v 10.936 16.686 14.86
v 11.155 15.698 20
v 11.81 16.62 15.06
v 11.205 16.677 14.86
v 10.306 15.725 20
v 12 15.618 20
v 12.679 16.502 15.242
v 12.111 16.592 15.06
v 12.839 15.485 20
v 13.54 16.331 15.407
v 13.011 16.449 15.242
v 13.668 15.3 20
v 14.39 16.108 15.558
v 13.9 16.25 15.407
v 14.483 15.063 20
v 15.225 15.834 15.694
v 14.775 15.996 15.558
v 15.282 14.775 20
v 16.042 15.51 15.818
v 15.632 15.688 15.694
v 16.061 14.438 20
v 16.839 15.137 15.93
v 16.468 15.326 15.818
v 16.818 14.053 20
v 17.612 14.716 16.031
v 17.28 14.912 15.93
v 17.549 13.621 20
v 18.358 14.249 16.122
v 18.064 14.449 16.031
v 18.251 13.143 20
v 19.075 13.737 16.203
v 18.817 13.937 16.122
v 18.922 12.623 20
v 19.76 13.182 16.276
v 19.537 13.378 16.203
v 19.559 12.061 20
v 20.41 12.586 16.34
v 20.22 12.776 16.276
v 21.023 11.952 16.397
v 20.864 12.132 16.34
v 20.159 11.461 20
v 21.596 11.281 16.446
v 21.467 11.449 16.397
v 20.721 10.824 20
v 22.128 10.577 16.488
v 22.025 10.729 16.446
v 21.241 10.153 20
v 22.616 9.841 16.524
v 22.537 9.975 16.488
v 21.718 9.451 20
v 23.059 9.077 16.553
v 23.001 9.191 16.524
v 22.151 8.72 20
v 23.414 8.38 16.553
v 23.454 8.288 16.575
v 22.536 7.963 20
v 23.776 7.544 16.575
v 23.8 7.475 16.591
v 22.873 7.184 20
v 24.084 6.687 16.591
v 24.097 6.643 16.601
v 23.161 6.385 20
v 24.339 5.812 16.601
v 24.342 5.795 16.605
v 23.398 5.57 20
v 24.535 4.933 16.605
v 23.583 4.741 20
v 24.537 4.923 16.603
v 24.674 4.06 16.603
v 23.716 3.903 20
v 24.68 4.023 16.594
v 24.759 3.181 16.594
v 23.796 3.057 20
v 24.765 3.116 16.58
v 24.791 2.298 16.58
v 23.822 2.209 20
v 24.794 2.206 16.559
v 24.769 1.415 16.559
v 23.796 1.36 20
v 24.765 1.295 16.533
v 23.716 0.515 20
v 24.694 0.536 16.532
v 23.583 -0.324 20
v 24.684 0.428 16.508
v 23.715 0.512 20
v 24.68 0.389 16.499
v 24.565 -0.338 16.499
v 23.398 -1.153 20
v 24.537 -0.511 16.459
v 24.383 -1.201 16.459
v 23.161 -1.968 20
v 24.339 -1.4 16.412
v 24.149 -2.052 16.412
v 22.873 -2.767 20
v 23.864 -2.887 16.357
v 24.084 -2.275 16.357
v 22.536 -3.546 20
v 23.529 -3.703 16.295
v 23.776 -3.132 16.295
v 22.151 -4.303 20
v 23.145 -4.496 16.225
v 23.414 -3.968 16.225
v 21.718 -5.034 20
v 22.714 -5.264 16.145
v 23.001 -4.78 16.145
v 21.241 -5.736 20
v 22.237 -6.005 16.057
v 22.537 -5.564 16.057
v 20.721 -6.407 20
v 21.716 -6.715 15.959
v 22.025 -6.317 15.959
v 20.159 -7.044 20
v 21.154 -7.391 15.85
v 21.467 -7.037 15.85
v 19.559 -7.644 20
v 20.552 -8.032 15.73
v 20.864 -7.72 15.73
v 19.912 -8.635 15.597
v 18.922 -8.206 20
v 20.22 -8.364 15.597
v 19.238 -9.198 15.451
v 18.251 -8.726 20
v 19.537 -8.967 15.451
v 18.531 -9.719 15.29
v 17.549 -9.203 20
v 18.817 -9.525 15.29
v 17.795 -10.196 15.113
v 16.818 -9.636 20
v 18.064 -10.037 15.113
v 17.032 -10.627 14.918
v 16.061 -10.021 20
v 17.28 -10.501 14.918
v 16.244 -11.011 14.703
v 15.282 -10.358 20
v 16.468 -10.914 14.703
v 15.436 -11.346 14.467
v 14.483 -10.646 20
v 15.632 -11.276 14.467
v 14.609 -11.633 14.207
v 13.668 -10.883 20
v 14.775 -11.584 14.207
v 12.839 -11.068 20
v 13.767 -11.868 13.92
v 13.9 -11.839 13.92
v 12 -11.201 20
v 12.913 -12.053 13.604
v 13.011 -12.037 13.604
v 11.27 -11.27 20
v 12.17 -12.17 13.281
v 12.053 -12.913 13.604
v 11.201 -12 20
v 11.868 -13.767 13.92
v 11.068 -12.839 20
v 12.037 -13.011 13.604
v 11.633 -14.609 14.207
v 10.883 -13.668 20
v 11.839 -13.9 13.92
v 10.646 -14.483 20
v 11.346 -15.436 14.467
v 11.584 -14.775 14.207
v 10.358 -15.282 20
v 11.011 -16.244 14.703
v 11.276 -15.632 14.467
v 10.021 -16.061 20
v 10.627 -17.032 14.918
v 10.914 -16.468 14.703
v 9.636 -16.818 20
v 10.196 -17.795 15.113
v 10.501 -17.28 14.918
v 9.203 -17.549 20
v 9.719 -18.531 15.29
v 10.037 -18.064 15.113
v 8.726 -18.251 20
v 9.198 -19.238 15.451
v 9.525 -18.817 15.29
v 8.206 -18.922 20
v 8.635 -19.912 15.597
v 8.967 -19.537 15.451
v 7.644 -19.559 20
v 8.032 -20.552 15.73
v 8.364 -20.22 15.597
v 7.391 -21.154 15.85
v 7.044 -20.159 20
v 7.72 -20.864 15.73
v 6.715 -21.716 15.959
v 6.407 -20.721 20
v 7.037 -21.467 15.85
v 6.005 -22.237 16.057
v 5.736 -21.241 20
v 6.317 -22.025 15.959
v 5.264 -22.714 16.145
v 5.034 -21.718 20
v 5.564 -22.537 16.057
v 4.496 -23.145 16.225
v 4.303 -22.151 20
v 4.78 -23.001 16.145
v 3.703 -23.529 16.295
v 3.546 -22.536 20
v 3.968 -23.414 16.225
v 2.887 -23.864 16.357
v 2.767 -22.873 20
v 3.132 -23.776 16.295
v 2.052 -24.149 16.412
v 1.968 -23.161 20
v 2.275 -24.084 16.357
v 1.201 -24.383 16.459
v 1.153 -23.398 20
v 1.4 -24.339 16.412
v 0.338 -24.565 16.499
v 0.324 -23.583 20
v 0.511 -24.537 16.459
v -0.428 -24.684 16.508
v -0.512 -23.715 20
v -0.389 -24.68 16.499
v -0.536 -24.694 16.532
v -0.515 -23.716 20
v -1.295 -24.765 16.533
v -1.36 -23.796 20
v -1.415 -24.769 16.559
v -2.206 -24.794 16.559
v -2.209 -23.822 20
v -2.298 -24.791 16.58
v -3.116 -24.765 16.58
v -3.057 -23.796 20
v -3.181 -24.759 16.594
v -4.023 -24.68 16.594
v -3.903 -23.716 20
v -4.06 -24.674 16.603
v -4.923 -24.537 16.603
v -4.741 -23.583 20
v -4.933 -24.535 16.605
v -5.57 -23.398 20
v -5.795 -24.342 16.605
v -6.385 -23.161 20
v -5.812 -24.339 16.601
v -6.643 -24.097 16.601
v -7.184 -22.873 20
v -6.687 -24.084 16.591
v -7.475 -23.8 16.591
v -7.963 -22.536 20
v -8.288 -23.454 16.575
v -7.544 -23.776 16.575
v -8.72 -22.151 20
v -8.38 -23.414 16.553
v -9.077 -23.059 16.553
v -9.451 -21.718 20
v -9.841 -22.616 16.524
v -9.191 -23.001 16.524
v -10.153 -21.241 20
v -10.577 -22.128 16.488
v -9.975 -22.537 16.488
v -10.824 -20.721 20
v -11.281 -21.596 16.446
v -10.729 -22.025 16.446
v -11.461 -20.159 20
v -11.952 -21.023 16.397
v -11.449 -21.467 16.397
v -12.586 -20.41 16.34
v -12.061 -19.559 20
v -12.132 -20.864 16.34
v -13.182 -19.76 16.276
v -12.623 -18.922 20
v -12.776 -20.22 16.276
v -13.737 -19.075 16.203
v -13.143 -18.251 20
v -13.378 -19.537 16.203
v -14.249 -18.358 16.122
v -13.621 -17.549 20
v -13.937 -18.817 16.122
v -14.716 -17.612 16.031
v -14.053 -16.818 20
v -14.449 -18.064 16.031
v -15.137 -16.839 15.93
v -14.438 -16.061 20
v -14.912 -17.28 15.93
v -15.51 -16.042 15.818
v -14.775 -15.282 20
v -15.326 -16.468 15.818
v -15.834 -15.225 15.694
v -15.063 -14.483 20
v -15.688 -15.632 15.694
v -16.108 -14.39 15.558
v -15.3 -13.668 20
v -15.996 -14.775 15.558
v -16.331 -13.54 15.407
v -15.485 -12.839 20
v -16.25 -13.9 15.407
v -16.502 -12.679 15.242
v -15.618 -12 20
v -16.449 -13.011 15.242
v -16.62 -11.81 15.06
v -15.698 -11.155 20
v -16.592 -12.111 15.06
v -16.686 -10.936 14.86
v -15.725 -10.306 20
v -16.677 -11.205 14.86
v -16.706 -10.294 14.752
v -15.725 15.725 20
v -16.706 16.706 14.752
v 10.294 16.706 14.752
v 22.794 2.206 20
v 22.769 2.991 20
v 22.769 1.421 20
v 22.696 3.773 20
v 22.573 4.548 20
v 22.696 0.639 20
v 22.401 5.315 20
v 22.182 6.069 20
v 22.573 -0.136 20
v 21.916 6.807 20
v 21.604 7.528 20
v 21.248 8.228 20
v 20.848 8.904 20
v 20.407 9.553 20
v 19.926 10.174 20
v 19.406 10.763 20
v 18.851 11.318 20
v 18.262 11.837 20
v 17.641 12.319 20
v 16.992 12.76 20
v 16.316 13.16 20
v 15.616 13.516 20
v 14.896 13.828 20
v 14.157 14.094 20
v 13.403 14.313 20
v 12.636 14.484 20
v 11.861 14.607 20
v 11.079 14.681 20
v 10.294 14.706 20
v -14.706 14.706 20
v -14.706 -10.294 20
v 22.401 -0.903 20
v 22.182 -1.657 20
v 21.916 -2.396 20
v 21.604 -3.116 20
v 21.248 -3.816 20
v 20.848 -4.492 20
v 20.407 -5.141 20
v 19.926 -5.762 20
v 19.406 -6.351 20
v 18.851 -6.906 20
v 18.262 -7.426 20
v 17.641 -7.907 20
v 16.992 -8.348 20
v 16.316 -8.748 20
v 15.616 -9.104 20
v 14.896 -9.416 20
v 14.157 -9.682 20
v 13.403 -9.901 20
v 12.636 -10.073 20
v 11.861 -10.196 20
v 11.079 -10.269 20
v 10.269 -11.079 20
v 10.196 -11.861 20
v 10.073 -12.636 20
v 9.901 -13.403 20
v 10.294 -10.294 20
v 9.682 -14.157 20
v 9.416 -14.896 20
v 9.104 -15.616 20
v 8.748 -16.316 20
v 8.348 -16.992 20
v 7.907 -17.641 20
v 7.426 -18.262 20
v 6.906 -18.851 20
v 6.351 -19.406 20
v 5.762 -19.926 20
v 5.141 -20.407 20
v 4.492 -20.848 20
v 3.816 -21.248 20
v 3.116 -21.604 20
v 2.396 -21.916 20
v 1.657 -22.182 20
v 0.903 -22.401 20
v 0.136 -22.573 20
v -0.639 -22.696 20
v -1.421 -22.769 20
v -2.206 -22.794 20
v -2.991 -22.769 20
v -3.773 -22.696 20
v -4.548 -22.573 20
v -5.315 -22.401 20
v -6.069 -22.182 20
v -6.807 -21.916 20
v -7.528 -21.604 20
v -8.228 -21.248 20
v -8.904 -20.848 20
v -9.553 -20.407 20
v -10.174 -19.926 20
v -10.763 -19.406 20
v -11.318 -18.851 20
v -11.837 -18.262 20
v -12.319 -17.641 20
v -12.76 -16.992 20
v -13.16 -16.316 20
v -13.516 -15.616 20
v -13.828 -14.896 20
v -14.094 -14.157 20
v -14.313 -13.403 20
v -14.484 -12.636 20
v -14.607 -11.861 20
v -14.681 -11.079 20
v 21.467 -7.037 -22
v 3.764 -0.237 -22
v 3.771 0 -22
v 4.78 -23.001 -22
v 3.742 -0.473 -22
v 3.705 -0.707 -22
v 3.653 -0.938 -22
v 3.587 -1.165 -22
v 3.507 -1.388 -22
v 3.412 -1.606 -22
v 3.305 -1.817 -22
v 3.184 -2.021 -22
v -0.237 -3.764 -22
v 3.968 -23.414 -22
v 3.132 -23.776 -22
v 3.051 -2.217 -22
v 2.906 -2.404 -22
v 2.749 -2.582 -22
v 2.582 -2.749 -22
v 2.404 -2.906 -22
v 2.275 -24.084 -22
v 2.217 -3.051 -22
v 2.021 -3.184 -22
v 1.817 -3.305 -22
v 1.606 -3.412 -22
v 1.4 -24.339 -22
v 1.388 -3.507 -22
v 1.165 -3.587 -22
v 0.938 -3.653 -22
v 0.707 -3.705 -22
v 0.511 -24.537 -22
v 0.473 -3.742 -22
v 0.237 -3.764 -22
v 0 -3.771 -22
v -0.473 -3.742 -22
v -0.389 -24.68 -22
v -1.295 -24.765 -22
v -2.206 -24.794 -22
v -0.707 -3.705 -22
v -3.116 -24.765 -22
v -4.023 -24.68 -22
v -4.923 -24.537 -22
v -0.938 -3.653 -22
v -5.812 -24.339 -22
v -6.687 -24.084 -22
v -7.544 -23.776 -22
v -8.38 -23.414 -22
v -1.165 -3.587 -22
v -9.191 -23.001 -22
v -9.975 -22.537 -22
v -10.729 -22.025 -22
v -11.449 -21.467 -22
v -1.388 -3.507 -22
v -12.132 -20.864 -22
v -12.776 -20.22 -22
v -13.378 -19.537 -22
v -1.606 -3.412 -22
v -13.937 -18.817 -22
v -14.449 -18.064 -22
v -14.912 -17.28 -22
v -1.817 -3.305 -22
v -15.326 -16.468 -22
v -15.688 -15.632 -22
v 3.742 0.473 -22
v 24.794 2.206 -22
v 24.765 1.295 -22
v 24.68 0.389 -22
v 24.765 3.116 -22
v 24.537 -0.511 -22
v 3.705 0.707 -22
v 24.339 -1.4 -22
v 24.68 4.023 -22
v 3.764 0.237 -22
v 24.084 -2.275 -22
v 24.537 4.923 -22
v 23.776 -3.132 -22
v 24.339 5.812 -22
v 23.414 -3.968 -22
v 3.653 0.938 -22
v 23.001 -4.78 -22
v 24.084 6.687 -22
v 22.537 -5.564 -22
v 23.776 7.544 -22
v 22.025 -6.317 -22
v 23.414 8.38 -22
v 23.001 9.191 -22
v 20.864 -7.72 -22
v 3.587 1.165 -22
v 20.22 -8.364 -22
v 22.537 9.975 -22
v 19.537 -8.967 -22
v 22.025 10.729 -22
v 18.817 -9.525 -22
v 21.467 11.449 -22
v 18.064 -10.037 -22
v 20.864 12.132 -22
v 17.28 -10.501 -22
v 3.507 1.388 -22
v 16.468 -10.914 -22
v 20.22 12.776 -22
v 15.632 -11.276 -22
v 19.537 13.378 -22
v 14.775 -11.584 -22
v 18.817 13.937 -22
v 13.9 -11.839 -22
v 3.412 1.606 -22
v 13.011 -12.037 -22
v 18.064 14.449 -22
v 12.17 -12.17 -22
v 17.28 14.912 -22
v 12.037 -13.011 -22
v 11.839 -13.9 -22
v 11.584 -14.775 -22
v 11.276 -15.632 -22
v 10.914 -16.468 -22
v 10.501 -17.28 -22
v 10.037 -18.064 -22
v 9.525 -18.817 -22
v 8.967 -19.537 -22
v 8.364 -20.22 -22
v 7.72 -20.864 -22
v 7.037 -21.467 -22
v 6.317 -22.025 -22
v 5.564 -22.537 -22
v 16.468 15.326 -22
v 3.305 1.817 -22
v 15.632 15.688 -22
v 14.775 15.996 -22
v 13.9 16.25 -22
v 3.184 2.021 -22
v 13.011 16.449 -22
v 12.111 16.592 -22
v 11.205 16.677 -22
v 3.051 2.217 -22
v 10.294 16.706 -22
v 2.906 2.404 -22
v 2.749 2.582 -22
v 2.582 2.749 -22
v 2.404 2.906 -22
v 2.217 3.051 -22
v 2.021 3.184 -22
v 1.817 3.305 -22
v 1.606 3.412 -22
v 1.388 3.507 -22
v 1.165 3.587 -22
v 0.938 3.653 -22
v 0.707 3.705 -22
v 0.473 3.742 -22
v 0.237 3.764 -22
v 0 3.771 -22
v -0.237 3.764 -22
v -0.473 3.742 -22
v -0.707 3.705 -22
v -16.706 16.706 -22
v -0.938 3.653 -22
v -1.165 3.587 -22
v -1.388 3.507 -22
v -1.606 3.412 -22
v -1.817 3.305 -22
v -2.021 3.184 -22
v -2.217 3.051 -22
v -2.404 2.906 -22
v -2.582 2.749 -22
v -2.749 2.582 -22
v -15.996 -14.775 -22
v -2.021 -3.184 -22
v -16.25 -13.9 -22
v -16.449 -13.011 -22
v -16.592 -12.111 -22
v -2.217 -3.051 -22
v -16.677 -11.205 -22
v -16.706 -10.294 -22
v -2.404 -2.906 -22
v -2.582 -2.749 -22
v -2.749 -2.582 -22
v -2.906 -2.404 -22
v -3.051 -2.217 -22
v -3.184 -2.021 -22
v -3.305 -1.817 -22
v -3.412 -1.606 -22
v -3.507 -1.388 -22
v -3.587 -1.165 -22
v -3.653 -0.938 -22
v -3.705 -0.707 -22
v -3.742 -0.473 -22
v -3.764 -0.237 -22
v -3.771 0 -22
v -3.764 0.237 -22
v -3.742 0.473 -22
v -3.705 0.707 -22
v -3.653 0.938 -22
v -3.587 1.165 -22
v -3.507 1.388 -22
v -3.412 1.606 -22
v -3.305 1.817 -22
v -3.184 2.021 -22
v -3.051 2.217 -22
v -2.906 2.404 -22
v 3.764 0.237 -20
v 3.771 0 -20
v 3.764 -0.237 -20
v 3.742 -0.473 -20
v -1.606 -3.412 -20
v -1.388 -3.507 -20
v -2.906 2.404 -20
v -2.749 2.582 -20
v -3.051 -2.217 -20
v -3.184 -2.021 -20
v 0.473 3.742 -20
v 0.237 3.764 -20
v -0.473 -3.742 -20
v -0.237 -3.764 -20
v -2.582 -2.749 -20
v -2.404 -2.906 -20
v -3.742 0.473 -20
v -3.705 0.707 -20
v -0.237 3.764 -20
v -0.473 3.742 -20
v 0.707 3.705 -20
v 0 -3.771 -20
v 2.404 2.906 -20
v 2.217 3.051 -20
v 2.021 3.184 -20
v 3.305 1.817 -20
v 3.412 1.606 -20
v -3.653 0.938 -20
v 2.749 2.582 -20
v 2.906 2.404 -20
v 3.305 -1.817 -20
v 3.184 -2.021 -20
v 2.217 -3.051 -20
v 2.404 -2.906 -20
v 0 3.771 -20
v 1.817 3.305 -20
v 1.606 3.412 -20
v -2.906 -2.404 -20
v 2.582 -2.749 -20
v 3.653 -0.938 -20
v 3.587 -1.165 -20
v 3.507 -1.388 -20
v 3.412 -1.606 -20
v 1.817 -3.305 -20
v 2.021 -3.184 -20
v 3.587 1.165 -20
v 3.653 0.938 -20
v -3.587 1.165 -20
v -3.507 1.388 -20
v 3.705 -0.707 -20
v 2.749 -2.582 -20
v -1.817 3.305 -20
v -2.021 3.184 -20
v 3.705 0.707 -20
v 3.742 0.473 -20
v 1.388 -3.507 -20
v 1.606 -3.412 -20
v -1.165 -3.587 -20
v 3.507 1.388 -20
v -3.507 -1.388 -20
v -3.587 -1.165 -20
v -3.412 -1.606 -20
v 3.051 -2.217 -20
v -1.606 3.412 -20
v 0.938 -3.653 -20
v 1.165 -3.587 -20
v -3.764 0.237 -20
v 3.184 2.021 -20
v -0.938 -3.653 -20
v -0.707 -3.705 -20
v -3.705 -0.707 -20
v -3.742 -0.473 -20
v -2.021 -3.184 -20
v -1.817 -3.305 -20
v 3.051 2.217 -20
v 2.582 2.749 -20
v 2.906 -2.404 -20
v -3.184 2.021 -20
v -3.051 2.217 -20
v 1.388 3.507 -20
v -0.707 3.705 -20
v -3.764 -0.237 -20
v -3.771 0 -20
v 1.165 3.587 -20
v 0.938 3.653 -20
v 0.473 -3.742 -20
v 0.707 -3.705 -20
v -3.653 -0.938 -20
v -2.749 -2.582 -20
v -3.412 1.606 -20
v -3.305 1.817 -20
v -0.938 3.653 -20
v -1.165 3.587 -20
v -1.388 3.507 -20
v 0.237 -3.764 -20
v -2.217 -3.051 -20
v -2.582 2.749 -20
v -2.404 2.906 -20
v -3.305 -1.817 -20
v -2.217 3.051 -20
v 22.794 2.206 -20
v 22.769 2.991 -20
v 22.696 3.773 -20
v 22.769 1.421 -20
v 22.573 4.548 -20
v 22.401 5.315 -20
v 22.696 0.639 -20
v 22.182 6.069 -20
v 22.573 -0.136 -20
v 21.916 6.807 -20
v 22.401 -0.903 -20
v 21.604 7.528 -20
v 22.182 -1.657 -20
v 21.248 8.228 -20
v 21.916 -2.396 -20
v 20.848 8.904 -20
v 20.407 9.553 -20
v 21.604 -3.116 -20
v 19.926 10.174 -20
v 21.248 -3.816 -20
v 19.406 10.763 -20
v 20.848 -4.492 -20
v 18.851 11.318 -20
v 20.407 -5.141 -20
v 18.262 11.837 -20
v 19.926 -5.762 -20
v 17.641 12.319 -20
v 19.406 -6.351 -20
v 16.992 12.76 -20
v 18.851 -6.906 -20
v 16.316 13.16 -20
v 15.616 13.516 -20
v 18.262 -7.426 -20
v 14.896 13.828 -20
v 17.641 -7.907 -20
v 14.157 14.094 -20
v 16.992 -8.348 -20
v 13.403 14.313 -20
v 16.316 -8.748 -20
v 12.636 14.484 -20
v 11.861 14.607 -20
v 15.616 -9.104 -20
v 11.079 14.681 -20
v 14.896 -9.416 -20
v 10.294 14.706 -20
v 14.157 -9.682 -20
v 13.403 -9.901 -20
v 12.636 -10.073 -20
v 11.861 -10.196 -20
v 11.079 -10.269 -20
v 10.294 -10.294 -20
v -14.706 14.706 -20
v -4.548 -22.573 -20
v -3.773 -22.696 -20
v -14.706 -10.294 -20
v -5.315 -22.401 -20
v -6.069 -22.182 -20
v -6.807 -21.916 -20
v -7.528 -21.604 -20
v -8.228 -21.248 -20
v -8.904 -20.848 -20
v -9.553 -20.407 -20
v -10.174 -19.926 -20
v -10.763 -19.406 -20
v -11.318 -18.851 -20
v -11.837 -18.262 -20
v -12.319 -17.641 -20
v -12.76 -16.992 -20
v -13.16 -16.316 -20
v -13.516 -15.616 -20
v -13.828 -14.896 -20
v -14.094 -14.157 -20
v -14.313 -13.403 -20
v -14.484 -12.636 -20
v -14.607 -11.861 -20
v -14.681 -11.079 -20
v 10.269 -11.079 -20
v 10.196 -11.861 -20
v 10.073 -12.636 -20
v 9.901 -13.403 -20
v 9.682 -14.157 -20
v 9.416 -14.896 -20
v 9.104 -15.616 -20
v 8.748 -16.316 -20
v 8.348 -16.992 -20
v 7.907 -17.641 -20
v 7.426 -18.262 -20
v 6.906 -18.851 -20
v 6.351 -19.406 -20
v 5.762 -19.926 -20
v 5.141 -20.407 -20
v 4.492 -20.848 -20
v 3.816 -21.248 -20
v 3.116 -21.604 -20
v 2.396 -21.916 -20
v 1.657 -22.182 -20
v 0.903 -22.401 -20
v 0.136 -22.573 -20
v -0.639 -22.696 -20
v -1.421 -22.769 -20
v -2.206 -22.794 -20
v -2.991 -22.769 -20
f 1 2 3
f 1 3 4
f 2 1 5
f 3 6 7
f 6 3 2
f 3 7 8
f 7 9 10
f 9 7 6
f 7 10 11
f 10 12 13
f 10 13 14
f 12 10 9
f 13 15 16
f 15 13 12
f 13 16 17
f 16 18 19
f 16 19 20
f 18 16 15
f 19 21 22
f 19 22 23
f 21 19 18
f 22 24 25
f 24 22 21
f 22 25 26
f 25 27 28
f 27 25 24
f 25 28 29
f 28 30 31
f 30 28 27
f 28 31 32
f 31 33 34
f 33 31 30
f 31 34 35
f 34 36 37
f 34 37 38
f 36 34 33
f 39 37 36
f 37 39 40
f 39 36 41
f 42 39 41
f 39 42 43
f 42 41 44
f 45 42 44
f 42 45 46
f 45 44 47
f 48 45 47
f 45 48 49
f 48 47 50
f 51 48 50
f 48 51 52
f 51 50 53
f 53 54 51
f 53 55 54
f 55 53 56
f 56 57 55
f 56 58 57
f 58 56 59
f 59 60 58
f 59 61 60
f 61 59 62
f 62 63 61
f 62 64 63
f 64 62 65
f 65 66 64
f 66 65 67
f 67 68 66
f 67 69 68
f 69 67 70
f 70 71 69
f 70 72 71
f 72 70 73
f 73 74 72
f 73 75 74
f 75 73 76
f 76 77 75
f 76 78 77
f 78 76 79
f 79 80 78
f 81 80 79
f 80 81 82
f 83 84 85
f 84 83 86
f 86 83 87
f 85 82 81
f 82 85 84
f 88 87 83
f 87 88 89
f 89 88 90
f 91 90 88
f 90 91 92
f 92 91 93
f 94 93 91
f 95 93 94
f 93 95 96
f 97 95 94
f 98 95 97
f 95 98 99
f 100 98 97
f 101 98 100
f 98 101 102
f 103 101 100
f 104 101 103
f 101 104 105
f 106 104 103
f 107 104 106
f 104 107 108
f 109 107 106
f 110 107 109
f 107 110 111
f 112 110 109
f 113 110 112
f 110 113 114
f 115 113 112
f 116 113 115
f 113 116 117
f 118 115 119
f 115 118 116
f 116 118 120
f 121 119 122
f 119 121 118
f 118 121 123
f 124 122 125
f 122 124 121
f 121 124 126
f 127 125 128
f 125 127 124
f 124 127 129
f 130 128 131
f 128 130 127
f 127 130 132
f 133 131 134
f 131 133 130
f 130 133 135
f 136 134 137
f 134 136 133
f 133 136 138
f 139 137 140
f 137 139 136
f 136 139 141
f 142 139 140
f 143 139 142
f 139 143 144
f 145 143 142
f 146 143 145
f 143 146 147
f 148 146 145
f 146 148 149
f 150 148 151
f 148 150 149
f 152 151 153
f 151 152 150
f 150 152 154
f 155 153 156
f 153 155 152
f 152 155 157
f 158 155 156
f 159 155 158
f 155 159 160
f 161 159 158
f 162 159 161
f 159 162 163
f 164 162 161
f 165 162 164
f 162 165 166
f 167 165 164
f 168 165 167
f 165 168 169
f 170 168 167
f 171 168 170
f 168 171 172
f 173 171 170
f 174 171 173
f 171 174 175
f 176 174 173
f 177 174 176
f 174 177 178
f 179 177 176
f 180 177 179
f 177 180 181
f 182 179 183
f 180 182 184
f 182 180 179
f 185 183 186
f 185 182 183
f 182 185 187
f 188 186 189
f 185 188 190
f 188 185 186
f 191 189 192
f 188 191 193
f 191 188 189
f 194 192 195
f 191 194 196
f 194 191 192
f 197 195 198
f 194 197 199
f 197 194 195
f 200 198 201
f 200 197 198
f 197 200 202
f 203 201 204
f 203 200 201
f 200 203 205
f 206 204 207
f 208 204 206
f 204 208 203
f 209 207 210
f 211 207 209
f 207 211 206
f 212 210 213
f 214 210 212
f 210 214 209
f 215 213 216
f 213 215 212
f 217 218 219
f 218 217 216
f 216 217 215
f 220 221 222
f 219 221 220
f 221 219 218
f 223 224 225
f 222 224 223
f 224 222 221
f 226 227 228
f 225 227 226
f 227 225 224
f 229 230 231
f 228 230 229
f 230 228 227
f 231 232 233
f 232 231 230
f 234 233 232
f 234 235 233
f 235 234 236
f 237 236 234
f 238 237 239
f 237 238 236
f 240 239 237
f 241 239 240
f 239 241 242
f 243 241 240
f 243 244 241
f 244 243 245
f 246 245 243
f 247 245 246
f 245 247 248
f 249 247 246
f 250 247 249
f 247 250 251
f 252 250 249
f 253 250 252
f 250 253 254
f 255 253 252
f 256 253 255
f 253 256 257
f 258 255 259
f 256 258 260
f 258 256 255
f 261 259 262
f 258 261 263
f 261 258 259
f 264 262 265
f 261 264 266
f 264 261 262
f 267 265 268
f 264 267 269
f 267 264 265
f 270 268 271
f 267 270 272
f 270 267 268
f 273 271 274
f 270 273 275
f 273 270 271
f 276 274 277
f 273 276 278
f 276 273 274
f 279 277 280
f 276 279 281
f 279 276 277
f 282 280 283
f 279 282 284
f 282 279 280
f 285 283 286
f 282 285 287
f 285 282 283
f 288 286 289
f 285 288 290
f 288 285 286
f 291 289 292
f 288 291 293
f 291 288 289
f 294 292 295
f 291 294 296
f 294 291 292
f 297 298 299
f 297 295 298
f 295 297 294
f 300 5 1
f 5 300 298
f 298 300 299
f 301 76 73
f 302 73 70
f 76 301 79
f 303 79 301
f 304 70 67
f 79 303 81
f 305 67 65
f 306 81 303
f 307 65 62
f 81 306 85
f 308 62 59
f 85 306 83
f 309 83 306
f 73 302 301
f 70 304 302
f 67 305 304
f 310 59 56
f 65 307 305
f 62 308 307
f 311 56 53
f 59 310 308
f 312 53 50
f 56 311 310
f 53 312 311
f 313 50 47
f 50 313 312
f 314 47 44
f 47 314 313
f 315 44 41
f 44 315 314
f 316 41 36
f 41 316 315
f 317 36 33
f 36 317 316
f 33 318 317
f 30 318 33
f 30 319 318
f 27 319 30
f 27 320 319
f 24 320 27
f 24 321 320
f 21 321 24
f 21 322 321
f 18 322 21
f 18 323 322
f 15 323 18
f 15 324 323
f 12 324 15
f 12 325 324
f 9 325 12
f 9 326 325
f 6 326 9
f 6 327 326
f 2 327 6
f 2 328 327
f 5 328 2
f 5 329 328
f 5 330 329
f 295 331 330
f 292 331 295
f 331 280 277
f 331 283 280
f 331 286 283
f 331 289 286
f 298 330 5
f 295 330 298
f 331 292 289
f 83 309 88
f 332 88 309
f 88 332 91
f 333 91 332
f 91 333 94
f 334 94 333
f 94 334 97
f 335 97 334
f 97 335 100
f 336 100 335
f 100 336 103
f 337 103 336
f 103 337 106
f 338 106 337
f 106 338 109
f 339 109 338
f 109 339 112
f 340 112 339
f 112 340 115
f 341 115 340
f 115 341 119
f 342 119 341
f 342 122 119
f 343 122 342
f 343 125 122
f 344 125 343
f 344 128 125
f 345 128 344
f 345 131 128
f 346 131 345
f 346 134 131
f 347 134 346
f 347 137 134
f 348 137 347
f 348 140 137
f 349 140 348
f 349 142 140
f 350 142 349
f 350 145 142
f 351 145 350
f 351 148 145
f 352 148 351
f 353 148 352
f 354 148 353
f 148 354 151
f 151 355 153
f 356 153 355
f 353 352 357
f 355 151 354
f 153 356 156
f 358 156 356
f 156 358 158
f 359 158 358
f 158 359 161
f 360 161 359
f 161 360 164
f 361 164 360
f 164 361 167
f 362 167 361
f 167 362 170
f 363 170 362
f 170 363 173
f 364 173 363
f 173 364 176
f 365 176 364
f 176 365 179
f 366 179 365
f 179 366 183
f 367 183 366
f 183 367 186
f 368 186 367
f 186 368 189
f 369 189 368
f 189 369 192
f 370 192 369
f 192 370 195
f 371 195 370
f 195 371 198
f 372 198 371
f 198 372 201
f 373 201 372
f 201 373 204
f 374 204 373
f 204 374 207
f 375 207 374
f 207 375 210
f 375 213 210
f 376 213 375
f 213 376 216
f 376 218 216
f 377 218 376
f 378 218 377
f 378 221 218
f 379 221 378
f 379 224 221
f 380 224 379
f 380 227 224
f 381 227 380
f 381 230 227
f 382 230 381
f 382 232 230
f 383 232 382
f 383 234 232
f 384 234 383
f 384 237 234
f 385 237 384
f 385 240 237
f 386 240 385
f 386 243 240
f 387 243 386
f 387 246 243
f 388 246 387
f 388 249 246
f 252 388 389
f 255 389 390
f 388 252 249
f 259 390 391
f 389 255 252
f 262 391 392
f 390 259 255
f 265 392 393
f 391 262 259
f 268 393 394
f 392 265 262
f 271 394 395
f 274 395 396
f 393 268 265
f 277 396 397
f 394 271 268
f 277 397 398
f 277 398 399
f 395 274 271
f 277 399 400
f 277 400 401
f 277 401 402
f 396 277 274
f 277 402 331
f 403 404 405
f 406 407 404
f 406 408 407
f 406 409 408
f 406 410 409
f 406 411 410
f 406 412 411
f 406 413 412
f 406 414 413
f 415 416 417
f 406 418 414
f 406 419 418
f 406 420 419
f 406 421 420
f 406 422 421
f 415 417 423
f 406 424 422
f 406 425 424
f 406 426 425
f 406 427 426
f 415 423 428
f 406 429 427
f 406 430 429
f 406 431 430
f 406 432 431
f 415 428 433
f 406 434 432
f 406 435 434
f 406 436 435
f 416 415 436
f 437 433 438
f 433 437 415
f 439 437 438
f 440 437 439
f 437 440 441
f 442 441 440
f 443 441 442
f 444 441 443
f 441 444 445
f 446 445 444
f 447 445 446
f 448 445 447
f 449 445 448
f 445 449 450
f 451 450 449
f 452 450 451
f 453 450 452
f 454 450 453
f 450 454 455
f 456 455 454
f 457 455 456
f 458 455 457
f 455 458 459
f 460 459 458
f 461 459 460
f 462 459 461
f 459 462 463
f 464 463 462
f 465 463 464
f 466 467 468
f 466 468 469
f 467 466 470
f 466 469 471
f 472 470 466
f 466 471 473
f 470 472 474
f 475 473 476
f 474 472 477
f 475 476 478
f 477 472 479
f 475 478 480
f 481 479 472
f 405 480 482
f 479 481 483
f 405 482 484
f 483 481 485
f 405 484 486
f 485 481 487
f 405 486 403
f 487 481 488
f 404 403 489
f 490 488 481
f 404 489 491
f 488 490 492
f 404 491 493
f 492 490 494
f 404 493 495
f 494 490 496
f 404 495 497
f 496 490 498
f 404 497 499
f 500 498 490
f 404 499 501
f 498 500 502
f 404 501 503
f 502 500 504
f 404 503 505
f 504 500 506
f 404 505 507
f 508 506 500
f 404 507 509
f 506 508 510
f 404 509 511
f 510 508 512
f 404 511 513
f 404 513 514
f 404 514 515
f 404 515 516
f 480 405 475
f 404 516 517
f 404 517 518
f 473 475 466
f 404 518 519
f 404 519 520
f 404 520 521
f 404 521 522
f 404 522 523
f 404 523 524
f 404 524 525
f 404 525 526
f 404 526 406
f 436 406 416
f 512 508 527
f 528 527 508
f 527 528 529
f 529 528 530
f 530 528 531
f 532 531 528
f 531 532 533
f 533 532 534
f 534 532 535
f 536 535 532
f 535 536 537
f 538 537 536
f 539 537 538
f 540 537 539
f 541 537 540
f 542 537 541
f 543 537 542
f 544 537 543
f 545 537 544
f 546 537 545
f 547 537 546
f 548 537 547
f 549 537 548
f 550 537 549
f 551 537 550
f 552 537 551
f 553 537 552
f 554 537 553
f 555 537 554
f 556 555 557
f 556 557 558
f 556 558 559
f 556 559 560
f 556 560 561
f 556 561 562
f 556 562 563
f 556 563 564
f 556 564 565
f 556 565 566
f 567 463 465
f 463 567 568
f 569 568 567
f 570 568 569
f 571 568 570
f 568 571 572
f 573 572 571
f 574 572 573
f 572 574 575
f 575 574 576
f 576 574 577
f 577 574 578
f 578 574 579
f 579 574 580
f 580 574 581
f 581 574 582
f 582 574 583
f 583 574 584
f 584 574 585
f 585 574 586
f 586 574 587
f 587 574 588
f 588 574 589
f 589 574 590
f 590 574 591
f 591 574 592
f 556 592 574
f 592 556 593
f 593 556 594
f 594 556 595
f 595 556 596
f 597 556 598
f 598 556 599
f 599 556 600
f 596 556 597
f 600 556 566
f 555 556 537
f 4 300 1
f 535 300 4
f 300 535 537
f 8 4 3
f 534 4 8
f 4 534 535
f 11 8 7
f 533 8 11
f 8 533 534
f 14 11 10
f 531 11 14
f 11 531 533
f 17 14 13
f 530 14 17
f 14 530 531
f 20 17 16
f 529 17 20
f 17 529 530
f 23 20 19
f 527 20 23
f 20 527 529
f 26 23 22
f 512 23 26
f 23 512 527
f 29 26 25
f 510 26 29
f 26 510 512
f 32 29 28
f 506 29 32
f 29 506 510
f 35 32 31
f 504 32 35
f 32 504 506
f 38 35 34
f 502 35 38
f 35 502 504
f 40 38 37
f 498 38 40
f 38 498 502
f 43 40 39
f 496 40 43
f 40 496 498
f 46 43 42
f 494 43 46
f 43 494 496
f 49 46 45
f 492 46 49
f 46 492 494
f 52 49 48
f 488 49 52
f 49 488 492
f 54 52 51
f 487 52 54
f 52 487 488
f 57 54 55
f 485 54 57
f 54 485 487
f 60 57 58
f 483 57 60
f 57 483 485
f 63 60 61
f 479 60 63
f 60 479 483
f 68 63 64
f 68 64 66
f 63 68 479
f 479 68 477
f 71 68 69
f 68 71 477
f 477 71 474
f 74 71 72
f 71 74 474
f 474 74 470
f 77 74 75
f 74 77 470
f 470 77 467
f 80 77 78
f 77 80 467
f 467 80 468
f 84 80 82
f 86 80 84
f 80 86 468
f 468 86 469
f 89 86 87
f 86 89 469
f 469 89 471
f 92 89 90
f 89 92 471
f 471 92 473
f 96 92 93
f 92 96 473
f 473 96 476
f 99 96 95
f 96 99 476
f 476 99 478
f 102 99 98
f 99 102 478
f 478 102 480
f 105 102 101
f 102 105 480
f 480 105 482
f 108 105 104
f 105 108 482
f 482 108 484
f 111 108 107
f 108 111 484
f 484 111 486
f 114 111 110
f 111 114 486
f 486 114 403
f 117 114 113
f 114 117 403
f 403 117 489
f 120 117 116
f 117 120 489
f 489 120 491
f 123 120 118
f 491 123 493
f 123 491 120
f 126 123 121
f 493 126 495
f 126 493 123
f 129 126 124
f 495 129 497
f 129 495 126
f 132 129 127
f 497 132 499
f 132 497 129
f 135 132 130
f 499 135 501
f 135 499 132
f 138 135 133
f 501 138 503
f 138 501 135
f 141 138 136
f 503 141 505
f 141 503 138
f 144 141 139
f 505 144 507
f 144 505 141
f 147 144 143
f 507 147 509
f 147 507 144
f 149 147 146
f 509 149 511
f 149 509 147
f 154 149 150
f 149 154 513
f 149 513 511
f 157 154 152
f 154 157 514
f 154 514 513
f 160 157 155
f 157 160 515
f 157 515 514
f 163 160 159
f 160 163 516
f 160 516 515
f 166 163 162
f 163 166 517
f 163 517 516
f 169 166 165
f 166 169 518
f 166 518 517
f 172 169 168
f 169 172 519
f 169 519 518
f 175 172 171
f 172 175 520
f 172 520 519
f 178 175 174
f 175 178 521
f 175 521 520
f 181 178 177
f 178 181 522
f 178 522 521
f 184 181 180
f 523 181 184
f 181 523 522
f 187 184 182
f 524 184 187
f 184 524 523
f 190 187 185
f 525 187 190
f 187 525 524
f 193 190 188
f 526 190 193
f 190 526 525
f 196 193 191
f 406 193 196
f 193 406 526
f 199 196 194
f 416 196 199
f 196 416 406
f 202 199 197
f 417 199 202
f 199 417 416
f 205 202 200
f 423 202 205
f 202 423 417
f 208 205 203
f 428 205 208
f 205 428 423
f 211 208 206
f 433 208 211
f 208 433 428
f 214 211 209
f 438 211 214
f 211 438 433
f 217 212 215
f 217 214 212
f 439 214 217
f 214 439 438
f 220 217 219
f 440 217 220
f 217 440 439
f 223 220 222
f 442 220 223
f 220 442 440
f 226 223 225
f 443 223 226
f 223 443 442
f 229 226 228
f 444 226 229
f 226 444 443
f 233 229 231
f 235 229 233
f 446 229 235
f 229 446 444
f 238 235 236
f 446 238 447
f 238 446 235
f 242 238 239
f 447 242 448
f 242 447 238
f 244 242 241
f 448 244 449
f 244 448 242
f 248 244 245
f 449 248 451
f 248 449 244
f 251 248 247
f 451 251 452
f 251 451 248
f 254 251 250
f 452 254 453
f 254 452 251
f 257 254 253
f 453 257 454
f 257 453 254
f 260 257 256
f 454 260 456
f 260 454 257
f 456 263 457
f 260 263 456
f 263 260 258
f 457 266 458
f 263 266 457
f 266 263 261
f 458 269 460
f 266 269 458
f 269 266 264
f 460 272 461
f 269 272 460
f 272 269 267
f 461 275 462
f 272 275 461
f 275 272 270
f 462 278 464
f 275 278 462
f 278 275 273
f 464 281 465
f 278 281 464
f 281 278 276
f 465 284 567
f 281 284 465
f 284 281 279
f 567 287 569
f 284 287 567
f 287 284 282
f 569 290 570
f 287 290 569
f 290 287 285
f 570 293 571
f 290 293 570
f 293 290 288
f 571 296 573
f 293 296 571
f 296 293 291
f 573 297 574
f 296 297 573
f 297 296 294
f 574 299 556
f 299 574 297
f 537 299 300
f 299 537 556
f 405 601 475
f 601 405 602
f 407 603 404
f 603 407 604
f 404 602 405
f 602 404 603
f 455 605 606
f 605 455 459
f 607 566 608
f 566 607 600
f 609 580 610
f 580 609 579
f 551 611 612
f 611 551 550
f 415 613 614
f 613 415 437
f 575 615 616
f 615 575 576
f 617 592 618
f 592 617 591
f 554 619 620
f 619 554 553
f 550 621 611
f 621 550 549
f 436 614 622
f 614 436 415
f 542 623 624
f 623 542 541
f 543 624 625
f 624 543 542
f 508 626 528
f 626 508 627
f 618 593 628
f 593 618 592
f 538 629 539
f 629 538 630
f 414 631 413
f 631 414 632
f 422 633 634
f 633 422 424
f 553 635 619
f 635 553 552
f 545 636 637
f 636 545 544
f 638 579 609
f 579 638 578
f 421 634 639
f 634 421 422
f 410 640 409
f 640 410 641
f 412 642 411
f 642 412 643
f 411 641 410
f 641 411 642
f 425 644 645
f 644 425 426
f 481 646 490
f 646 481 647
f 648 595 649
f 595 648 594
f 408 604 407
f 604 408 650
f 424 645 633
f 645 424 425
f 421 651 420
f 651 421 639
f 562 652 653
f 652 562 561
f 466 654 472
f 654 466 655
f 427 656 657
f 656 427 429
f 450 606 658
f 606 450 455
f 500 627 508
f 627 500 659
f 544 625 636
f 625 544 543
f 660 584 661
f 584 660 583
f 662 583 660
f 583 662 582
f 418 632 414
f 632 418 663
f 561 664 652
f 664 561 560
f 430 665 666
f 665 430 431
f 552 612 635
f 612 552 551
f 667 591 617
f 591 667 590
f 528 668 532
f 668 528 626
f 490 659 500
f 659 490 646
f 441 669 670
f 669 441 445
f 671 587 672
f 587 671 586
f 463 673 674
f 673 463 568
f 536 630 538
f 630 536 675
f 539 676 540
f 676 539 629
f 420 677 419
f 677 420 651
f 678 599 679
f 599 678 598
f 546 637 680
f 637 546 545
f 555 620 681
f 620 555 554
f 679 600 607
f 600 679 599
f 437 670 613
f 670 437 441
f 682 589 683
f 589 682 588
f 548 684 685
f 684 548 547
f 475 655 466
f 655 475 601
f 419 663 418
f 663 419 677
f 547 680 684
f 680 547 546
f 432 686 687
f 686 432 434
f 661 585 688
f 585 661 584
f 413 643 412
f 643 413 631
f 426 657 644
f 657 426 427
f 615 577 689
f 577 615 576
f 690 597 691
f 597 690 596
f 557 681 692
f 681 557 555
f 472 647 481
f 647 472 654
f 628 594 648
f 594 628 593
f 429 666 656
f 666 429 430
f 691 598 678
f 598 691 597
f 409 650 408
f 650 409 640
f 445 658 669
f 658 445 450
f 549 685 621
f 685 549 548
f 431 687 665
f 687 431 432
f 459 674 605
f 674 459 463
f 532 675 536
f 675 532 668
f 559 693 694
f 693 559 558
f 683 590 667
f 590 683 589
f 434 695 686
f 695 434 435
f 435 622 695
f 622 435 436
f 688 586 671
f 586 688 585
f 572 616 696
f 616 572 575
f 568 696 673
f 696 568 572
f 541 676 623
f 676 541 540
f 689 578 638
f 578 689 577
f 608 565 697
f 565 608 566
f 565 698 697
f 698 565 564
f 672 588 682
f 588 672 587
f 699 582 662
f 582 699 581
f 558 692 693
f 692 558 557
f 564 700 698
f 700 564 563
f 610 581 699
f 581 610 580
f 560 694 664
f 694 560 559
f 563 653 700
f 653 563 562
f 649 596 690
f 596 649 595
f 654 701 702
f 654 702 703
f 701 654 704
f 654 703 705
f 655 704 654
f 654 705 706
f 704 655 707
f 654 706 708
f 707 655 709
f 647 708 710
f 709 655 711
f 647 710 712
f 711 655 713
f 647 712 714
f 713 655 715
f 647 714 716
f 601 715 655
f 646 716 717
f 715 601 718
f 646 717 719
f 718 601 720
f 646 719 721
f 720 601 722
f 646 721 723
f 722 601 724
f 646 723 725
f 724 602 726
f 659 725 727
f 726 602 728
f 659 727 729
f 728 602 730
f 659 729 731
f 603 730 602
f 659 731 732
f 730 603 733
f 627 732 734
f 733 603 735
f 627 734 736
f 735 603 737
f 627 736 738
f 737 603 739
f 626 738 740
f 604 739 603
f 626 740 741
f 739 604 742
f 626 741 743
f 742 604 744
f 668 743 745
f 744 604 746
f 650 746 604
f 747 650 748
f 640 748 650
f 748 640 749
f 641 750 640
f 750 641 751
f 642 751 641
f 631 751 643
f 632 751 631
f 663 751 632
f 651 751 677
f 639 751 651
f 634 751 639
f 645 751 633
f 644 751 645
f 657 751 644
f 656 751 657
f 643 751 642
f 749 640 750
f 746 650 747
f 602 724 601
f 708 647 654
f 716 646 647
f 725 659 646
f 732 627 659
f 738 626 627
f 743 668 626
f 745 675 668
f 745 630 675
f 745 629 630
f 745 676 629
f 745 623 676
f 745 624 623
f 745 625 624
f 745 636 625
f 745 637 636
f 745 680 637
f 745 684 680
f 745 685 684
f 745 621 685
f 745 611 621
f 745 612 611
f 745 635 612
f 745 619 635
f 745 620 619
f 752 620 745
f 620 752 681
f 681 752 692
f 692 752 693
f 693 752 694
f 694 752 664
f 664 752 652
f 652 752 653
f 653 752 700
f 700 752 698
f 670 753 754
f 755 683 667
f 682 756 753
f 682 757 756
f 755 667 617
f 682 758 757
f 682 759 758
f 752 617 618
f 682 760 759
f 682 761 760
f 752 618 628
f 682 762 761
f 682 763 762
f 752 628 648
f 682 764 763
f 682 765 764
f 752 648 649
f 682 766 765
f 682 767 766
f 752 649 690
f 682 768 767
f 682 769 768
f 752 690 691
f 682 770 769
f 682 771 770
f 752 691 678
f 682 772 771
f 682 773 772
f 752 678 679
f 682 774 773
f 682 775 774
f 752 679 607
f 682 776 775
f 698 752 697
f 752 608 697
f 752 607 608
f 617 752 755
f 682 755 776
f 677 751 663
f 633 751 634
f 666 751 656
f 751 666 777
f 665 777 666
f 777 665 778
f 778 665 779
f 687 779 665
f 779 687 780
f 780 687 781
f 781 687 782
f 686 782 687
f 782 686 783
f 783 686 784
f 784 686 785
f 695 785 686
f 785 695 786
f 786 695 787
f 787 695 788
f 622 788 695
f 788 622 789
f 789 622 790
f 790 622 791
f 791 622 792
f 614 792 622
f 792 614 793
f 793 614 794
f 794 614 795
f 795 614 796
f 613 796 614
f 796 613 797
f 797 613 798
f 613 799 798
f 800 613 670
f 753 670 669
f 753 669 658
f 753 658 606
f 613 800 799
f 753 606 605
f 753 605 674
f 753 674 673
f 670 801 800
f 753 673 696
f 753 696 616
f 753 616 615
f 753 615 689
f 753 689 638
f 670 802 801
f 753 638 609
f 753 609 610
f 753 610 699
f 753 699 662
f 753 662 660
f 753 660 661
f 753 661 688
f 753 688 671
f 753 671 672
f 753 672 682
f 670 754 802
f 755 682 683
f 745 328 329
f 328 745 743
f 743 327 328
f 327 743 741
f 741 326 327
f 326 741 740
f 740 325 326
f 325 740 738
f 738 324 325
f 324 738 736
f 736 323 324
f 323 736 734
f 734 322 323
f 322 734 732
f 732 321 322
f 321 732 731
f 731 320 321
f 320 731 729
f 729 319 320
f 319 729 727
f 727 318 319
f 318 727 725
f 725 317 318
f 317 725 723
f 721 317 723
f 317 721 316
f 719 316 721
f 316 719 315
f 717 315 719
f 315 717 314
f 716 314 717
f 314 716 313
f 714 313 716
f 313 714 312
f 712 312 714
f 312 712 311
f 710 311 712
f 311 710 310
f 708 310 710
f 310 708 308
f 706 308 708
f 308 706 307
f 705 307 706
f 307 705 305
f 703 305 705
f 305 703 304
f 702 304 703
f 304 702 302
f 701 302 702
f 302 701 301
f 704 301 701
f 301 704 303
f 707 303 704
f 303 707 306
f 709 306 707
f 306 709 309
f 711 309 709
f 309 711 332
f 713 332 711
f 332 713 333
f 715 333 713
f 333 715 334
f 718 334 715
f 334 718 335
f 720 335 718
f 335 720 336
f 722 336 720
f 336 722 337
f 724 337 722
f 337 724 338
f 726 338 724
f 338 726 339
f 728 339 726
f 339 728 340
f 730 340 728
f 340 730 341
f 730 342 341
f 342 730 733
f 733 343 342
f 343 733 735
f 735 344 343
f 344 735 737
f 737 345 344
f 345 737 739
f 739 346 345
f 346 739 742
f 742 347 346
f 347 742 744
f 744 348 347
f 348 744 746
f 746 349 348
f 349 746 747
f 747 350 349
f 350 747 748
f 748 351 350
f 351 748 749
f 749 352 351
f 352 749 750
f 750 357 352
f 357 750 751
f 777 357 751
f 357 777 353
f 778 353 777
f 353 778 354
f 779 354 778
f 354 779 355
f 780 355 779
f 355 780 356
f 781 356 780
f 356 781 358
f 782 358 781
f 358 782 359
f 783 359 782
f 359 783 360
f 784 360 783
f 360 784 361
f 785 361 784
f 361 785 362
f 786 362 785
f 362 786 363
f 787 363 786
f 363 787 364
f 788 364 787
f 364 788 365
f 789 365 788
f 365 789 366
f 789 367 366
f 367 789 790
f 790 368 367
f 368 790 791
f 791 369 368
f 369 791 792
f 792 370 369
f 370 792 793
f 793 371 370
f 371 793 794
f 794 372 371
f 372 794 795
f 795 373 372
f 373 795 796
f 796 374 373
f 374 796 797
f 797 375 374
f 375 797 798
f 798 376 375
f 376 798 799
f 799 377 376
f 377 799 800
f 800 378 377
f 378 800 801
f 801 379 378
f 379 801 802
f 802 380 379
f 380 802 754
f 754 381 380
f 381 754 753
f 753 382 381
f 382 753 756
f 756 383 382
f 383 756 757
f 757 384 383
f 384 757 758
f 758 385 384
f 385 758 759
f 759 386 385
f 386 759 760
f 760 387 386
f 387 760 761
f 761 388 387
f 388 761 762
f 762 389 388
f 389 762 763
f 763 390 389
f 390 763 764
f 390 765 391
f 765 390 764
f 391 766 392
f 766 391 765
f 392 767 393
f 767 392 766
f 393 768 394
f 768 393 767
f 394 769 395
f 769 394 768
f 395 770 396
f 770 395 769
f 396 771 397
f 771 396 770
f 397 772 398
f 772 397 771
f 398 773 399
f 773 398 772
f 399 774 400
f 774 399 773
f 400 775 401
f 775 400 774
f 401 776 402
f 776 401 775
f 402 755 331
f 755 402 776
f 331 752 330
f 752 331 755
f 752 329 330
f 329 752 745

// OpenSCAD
// ************* Credits part *************
//            "Mini-sandwich Maker" 
// Programmed by Rudy RUFFEL - Decembre 2014
// Optimized for Customizer makerbot
//
//
//********************** License ******************
//**        "Mini-sandwich_Maker" by rr2s        **
//**  is licensed under the Creative Commons     **
//** - Attribution - Non-Commercial license.     **
//*************************************************
//
//
// ************* Declaration part *************
/* [Global] */

/* [Part] */
// Select the part you want to see. If you change the settings select all the parts with the same setting.
PartOfObject = "Base";// [Base:Base,Pusher:Pusher,Axispusher:Axis pusher,Cap:Cap]


/* [Type] */
// What type of Mini-sandwich you want.
Type = "Heart"; // [Cylinder:Cylinder,Square:Square,Hex:Hex,Octagonal:Octagonal,Rectangle:Rectangle,RectangleBevel:Rectangle/Square Bevel,Oval:Oval,Heart:Heart]
// What type cap of Mini-sandwich you want.
TypeCap = "Sphere";// [Cube:Cube,Sphere:Sphere]
// What type Axis Pusher of Mini-sandwich you want.
TypeAxis = "Cylinder";// [Square:Square,Cylinder:Cylinder,Hex:Hex]
// Resolution Bevel if you have choose Rectangle/Square Bevel
RectangleBevelResoltuion = 50;



/* [Settings] */
// (Height of your Mini-sandwich in mm)
Height = 35;
// (The width of your Mini-sandwich in mm. if it's a circle or oval this is the diameter.if it's Heart this is a size)
Width = 25; 
// (The length of your Mini-sandwich in mm. If it's Oval Length)
Length = 25;


/* [Hidden] */

	// ************* private variable *************
   // No change this variable. The code needs to be improved to use these variable.
	TP  = 5;//ThicknessPusher
	H   = Height+TP;
	W   = Width;
	L   = Length;
	TH  = 2 ; //ThicknessWall 
	// other
	HAP = H+10;  //Height Axis Of Piston
	WAP = W/3.5; //Width Axis Of Piston or diametre if cinylinder or oval
	LAP = L/3.5; //Length Axis Of Piston
	RSB = RectangleBevelResoltuion;


// ************* Executable part *************

Type_Part();

// ************* Module part Piston *************



// Axis Piston Print
module AxisOfPistonCylinder(){
		if (TypeAxis == "Cylinder"){
			translate([0,0,-HAP/2+H-TH]) cylinder(HAP+TH, WAP/2, WAP/2,$fn=100);
		}if (TypeAxis == "Square"){
			translate([0,0,-HAP/2+H-TH]) cylinder(HAP+TH, WAP/2, WAP/2,$fn=4);
		}else if (TypeAxis == "Hex"){
			translate([0,0,-HAP/2+H-TH]) cylinder(HAP+TH, WAP/2, WAP/2,$fn=6);
		}
	}



// Cap of the piston Sphere
module CapPistionSphere(){
		translate([0,0,HAP+H/2+-WAP*1.5]) difference(){
		sphere(W/2,$fn=150);
		translate([0,0,-W/2]) cube(W,center=true);
		}
}

// cap of the piston Cube
module CapPistionCube(){
	translate([0,0,HAP+H/2+WAP+-W/2]) cube ([W/1.5,L/1.5,W/2],center=true);
	}


// Axis Piston Cut
module AxisOfPistonCylinderCutBase(){
		if (TypeAxis == "Cylinder"){
			translate([0,0,-HAP/2+H-TH]) cylinder(HAP+TH, WAP/2+0.2, WAP/2+0.2,$fn=100);
		}if (TypeAxis == "Square"){
			translate([0,0,-HAP/2+H-TH]) cylinder(HAP+TH, WAP/2+0.2, WAP/2+0.2,$fn=4);
		}else if (TypeAxis == "Hex"){
			translate([0,0,-HAP/2+H-TH]) cylinder(HAP+TH, WAP/2+0.2, WAP/2+0.2,$fn=6);
		}
	}



// ************* Module part For Cylinder *************
module BaseCylinder(){
	translate([0,0,-H/2]) cylinder(H+TH, W/2+TH, W/2+TH,$fn=100);
}

module PusherCylinder(){
	translate([0,0,H/2-TP-TP/2]) cylinder(TP, W/2-0.5, W/2-0.5,$fn=100);
} 

module CutCylinder(){
	translate([0,0,-H/2-1]) cylinder(H+1, W/2, W/2,$fn=100);
}

module CutCylinderAngle(){
	difference(){
	translate([0,0,-H/2-1]) cylinder(H+TH, W/2+TH, W/2+TH+H/3,$fn=100);
	translate([0,0,-H/2-1]) cylinder(H+TH, W/2+TH-(TH/1.1), W/2+TH+H/3,$fn=100);
	}
}


// ************* Module part For Square *************	

module BaseSquare(){
	translate([0,0,-H/2]) cylinder(H+TH, W/2+TH*2, W/2+TH*2,$fn=4);
}

module PusherSquare(){
	translate([0,0,H/2-TP-TP/2]) cylinder(TP, W/2-0.5, W/2-0.5,$fn=4);
} 

module CutSquare(){
	translate([0,0,-H/2-1]) cylinder(H+1, W/2, W/2,$fn=4);
}

module CutSquareAngle(){
	difference(){
	translate([0,0,-H/2-1]) cylinder(H+TH, W/2+TH*2, W/2+TH+H/3,$fn=4);
	translate([0,0,-H/2-1]) cylinder(H+TH, W/2+TH*1.5-(TH/1.1), W/2+TH*4+H/3,$fn=4);
	}
}





// ************* Module part For Hex *************	
module BaseHex(){
	translate([0,0,-H/2]) cylinder(H+TH, W/2+TH, W/2+TH,$fn=6);
}

module PusherHex(){
	translate([0,0,H/2-TP-TP/2]) cylinder(TP, W/2-0.5, W/2-0.5,$fn=6);
} 

module CutHex(){
	translate([0,0,-H/2-1]) cylinder(H+1, W/2, W/2,$fn=6);
}

module CutHexAngle(){
	difference(){
	translate([0,0,-H/2-1]) cylinder(H+TH, W/2+TH, W/2+TH+H/3,$fn=6);
	translate([0,0,-H/2-1]) cylinder(H+TH, W/2+TH-(TH/1.1), W/2+TH+H/3,$fn=6);
	}
}



// ************* Module part For Octagonal *************	

module BaseOctagonal(){
	translate([0,0,-H/2]) cylinder(H+TH, W/2+TH, W/2+TH,$fn=8);
}

module PusherOctagonal(){
	translate([0,0,H/2-TP-TP/2]) cylinder(TP, W/2-0.5, W/2-0.5,$fn=8);
} 

module CutOctagonal(){
	translate([0,0,-H/2-1]) cylinder(H+1, W/2, W/2,$fn=8);
}

module CutOctagonalAngle(){
	difference(){
	translate([0,0,-H/2-1]) cylinder(H+TH, W/2+TH, W/2+TH+H/3,$fn=8);
	translate([0,0,-H/2-1]) cylinder(H+TH, W/2+TH-(TH/1.1), W/2+TH+H/3,$fn=8);
	}
}


// ************* Module part For Rectangle *************

module BaseRectangle(){
	translate([0,0,TH/2]) cube ([W+TH*2,L+TH*2,H+TH],center=true);
}

module PusherRectangle(){
	translate([0,0,H/2-TP]) cube ([W-0.5,L-0.5,TP],center=true);
} 

module CutRectangle(){
	translate([0,0,TH/2-1]) cube ([W,L,H+1],center=true);
}

module CutRectangleAngle(){
	difference(){
	translate([0,0,-H/2+-0.5])  linear_extrude(H+TH,scale=2)  square([W+TH*2,L+TH*2],center=true);
	translate([0,0,-H/2+-0.5])  linear_extrude(H+TH,scale=1.5)  square([W+TH,L+TH],center=true);
	}
}



// ************* Module part For RectangleBevel*************	

module BaseRectangleBevel(){
	minkowski(){
		translate([0,0,TH/2-1]) cube ([W+TH*2-20,L+TH*2-20,H+TH-2],center=true);
		cylinder(r=10,2,$fn = RSB);
	}
}

module PusherRectangleBevel(){
	minkowski(){
		translate([0,0,H/2-TP-TP/2+1.5])cube ([W-0.5-20,L-0.5-20,TP-2],center=true);
		cylinder(r=10,2,$fn = RSB);
	}
} 

module CutRectangleBevel(){
	minkowski(){
		translate([0,0,TH/2-2]) cube ([W-20,L-20,H-1],center=true);
		cylinder(r=10,2,$fn = RSB);
	}
}

module CutRectangleBevelAngle(){
	difference(){
			minkowski(){ BaseRectangleBevelAngle1(); cylinder(r=10,2,$fn = RSB);}
			minkowski(){ CutRectangleBevelAngle2(); cylinder(r=10,2,$fn = RSB);}
	}
}

module BaseRectangleBevelAngle1(){
	translate([0,0,-H/2+-0.5])  linear_extrude(H+TH,scale=2) square([W+TH*2-20,L+TH*2-20],center=true);
}

module CutRectangleBevelAngle2(){
	translate([0,0,-H/2+-0.5])  linear_extrude(H+TH,scale=3) square([W+TH-20,L+TH-20],center=true);
}






// ************* Module part For Oval *************

module BaseOval(){
	hull(){
		translate([0,-L/2,-H/2]) cylinder(H+TH, W/2+TH, W/2+TH,$fn=100);
		translate([0,L/2,-H/2]) cylinder(H+TH, W/2+TH, W/2+TH,$fn=100);
	}
}

module PusherOval(){
	hull(){
		translate([0,-L/2,H/2-TP-TP/2]) cylinder(TP, W/2-0.5, W/2-0.5,$fn=100);
		translate([0,L/2,H/2-TP-TP/2]) cylinder(TP, W/2-0.5, W/2-0.5,$fn=100);
	}
} 

module CutOval(){
	hull(){
		translate([0,-L/2,-H/2-1]) cylinder(H+1, W/2, W/2,$fn=100);
		translate([0,L/2,-H/2-1]) cylinder(H+1, W/2, W/2,$fn=100);
	}
}

module CutOvalAngle(){	
	difference(){
		hull(){
			translate([0,-L/2,-H/2-1]) cylinder(H+TH, W/2+TH, W/2+TH+H/3,$fn=100);
			translate([0,L/2,-H/2-1]) cylinder(H+TH, W/2+TH, W/2+TH+H/3,$fn=100);
		}
		hull(){
			translate([0,-L/2,-H/2-1]) cylinder(H+TH, W/2+TH-(TH/1.1), W/2+TH+H/3,$fn=100);
			translate([0,L/2,-H/2-1]) cylinder(H+TH, W/2+TH-(TH/1.1), W/2+TH+H/3,$fn=100);
		}
	}
}



// ************* Module part For Heart *************	

module BaseHeart(){
		translate ([-W/1.7+-TH,-W/1.7+-TH,-H/2]) 
		linear_extrude(H+TH)  
			union (){
			square (W+TH,W+TH);
			translate ([W/2+TH,W+TH,0]) circle(W/2+TH,$fn=100);
			translate ([W+TH,W/2+TH,0]) circle(W/2+TH,$fn=100);
		}
}

module PusherHeart(){
		translate ([-W/1.7+0.5,-W/1.7+0.5,H/2-TP-TP/2]) 
		linear_extrude(TP) union (){
			square (W-1,W-1);
			translate ([(W-1)/2,W-1,0]) circle((W-1)/2,$fn=100);
			translate ([W-1,(W-1)/2,0]) circle((W-1)/2,$fn=100);
		}
} 

module CutHeart(){
		translate ([-W/1.7,-W/1.7,-H/2+-1]) 
		linear_extrude(H+1) union (){
			square (W,W);
			translate ([W/2,W,0]) circle(W/2,$fn=100);
			translate ([W,W/2,0]) circle(W/2,$fn=100);
		}
}


module CutHeartAngle(){	
	difference(){
	translate ([0,0,-H/2-0.1]) linear_extrude(H+TH,scale=2) BaseHeartAngle1();
	translate ([0,0,-H/2-0.1]) linear_extrude(H+TH,scale=1.5)  CutHeartAngle2();
	}
}


module BaseHeartAngle1(){	
		translate ([-W/1.7+-TH,-W/1.7+-TH,0]) 
			union (){
			square (W+TH,W+TH);
			translate ([W/2+TH,W+TH,0]) circle(W/2+TH,$fn=100);
			translate ([W+TH,W/2+TH,0]) circle(W/2+TH,$fn=100);
		}
}


module CutHeartAngle2(){	
		translate ([-W/1.7+-TH/2,-W/1.7+-TH/2,0]) 
			union (){
			square (W+TH/2,W+TH/2);
			translate ([W/2+TH/2,W+TH/2,0]) circle(W/2+TH/2,$fn=100);
			translate ([W+TH/2,W/2+TH/2,0]) circle(W/2+TH/2,$fn=100);
		}
}



// ************* Type part *************

module Type_Part() {
// For the cylinder
	if (Type == "Cylinder"){
		if (PartOfObject  == "Base"){
				rotate([180,0,0])
				difference(){
				BaseCylinder();
				AxisOfPistonCylinderCutBase();
				CutCylinder();
				CutCylinderAngle();
			}
		}else if (PartOfObject  == "Pusher") {
				difference(){
				PusherCylinder();
				AxisOfPistonCylinder();
				}
		}else if (PartOfObject  == "Axispusher") {
			AxisOfPistonCylinder();
		}else{//cap
				if (TypeCap == "Sphere"){
					difference(){
						CapPistionSphere();
						AxisOfPistonCylinder();
					}
				}else if (TypeCap == "Cube"){
					difference(){
						CapPistionCube();
						AxisOfPistonCylinder();
					}
				}
		}



// For the Square
	}else if (Type == "Square") {
		if (PartOfObject  == "Base"){
				rotate([180,0,0])
				difference(){
					BaseSquare();
					AxisOfPistonCylinderCutBase();
					CutSquare();
					CutSquareAngle();
				}
		}else if (PartOfObject  == "Pusher") {
				difference(){
					PusherSquare();
					AxisOfPistonCylinder();
				}
		}else if (PartOfObject  == "Axispusher") {
			AxisOfPistonCylinder();
		}else{//cap
				if (TypeCap == "Sphere"){
					difference(){
						CapPistionSphere();
						AxisOfPistonCylinder();
					}
				}else if (TypeCap == "Cube"){
					difference(){
						CapPistionCube();
						AxisOfPistonCylinder();
					}
				}
		}



// For the Hex
	}else if (Type == "Hex") {
		if (PartOfObject  == "Base"){
				rotate([180,0,0])
				difference(){
					BaseHex();
					AxisOfPistonCylinderCutBase();
					CutHex();
					CutHexAngle();
				}
		}else if (PartOfObject  == "Pusher") {
				difference(){
					PusherHex();
					AxisOfPistonCylinder();
				}
		}else if (PartOfObject  == "Axispusher") {
			AxisOfPistonCylinder();
		}else{//cap
				if (TypeCap == "Sphere"){
					difference(){
						CapPistionSphere();
						AxisOfPistonCylinder();
					}
				}else if (TypeCap == "Cube"){
					difference(){
						CapPistionCube();
						AxisOfPistonCylinder();
					}
				}
		}



// For the Octagonal
	}else if (Type == "Octagonal") {
		if (PartOfObject  == "Base"){
				rotate([180,0,0])
				difference(){
					BaseOctagonal();
					AxisOfPistonCylinderCutBase();
					CutOctagonal();
					CutOctagonalAngle();
				}
		}else if (PartOfObject  == "Pusher") {
				difference(){
					PusherOctagonal();
					AxisOfPistonCylinder();
				}
		}else if (PartOfObject  == "Axispusher") {
			AxisOfPistonCylinder();
		}else{//cap
				if (TypeCap == "Sphere"){
					difference(){
						CapPistionSphere();
						AxisOfPistonCylinder();
					}
				}else if (TypeCap == "Cube"){
					difference(){
						CapPistionCube();
						AxisOfPistonCylinder();
					}
				}
		}




// For the Rectangle
	}else if (Type == "Rectangle") {
		if (PartOfObject  == "Base"){
				rotate([180,0,0])
				difference(){
					BaseRectangle();
					AxisOfPistonCylinderCutBase();
					CutRectangle();
					CutRectangleAngle();
				}				
		}else if (PartOfObject  == "Pusher") {
				difference(){
					PusherRectangle();
					AxisOfPistonCylinder();
				}
		}else if (PartOfObject  == "Axispusher") {
			AxisOfPistonCylinder();
		}else{//cap
				if (TypeCap == "Sphere"){
					difference(){
						CapPistionSphere();
						AxisOfPistonCylinder();
					}
				}else if (TypeCap == "Cube"){
					difference(){
						CapPistionCube();
						AxisOfPistonCylinder();
					}
				}
		}

// For the Rectangle Bevel
	}else if (Type == "RectangleBevel") {
		if (PartOfObject  == "Base"){
				rotate([180,0,0])
				difference(){
					BaseRectangleBevel();
					AxisOfPistonCylinderCutBase();
					CutRectangleBevel();
					CutRectangleBevelAngle();
				}				
		}else if (PartOfObject  == "Pusher") {
				difference(){
					PusherRectangleBevel();
					AxisOfPistonCylinder();
				}
		}else if (PartOfObject  == "Axispusher") {
			AxisOfPistonCylinder();
		}else{//cap
				if (TypeCap == "Sphere"){
					difference(){
						CapPistionSphere();
						AxisOfPistonCylinder();
					}
				}else if (TypeCap == "Cube"){
					difference(){
						CapPistionCube();
						AxisOfPistonCylinder();
					}
				}
		}


// For the Oval
	}else if (Type == "Oval") {
		if (PartOfObject  == "Base"){
				rotate([180,0,0])
				difference(){
					BaseOval();
					AxisOfPistonCylinderCutBase();
					CutOval();
					CutOvalAngle();
				}						
		}else if (PartOfObject  == "Pusher") {
				difference(){
					PusherOval();
					AxisOfPistonCylinder();
				}			
		}else if (PartOfObject  == "Axispusher") {
			AxisOfPistonCylinder();
		}else{//cap
				if (TypeCap == "Sphere"){
					difference(){
						CapPistionSphere();
						AxisOfPistonCylinder();
					}
				}else if (TypeCap == "Cube"){
					difference(){
						CapPistionCube();
						AxisOfPistonCylinder();
					}
				}
		}



// For the Heart
	}else {// For the Heart
		if (PartOfObject  == "Base"){
				rotate([180,0,0])
				difference(){
					BaseHeart();
					AxisOfPistonCylinderCutBase();
					CutHeart();
					CutHeartAngle();
				}						
		}else if (PartOfObject  == "Pusher") {
				difference(){
					PusherHeart();
					AxisOfPistonCylinder();
				}			
		}else if (PartOfObject  == "Axispusher") {
			AxisOfPistonCylinder();
		}else{//cap
				if (TypeCap == "Sphere"){
					difference(){
						CapPistionSphere();
						AxisOfPistonCylinder();
					}
				}else if (TypeCap == "Cube"){
					difference(){
						CapPistionCube();
						AxisOfPistonCylinder();
					}
				}
		}

	}
}
